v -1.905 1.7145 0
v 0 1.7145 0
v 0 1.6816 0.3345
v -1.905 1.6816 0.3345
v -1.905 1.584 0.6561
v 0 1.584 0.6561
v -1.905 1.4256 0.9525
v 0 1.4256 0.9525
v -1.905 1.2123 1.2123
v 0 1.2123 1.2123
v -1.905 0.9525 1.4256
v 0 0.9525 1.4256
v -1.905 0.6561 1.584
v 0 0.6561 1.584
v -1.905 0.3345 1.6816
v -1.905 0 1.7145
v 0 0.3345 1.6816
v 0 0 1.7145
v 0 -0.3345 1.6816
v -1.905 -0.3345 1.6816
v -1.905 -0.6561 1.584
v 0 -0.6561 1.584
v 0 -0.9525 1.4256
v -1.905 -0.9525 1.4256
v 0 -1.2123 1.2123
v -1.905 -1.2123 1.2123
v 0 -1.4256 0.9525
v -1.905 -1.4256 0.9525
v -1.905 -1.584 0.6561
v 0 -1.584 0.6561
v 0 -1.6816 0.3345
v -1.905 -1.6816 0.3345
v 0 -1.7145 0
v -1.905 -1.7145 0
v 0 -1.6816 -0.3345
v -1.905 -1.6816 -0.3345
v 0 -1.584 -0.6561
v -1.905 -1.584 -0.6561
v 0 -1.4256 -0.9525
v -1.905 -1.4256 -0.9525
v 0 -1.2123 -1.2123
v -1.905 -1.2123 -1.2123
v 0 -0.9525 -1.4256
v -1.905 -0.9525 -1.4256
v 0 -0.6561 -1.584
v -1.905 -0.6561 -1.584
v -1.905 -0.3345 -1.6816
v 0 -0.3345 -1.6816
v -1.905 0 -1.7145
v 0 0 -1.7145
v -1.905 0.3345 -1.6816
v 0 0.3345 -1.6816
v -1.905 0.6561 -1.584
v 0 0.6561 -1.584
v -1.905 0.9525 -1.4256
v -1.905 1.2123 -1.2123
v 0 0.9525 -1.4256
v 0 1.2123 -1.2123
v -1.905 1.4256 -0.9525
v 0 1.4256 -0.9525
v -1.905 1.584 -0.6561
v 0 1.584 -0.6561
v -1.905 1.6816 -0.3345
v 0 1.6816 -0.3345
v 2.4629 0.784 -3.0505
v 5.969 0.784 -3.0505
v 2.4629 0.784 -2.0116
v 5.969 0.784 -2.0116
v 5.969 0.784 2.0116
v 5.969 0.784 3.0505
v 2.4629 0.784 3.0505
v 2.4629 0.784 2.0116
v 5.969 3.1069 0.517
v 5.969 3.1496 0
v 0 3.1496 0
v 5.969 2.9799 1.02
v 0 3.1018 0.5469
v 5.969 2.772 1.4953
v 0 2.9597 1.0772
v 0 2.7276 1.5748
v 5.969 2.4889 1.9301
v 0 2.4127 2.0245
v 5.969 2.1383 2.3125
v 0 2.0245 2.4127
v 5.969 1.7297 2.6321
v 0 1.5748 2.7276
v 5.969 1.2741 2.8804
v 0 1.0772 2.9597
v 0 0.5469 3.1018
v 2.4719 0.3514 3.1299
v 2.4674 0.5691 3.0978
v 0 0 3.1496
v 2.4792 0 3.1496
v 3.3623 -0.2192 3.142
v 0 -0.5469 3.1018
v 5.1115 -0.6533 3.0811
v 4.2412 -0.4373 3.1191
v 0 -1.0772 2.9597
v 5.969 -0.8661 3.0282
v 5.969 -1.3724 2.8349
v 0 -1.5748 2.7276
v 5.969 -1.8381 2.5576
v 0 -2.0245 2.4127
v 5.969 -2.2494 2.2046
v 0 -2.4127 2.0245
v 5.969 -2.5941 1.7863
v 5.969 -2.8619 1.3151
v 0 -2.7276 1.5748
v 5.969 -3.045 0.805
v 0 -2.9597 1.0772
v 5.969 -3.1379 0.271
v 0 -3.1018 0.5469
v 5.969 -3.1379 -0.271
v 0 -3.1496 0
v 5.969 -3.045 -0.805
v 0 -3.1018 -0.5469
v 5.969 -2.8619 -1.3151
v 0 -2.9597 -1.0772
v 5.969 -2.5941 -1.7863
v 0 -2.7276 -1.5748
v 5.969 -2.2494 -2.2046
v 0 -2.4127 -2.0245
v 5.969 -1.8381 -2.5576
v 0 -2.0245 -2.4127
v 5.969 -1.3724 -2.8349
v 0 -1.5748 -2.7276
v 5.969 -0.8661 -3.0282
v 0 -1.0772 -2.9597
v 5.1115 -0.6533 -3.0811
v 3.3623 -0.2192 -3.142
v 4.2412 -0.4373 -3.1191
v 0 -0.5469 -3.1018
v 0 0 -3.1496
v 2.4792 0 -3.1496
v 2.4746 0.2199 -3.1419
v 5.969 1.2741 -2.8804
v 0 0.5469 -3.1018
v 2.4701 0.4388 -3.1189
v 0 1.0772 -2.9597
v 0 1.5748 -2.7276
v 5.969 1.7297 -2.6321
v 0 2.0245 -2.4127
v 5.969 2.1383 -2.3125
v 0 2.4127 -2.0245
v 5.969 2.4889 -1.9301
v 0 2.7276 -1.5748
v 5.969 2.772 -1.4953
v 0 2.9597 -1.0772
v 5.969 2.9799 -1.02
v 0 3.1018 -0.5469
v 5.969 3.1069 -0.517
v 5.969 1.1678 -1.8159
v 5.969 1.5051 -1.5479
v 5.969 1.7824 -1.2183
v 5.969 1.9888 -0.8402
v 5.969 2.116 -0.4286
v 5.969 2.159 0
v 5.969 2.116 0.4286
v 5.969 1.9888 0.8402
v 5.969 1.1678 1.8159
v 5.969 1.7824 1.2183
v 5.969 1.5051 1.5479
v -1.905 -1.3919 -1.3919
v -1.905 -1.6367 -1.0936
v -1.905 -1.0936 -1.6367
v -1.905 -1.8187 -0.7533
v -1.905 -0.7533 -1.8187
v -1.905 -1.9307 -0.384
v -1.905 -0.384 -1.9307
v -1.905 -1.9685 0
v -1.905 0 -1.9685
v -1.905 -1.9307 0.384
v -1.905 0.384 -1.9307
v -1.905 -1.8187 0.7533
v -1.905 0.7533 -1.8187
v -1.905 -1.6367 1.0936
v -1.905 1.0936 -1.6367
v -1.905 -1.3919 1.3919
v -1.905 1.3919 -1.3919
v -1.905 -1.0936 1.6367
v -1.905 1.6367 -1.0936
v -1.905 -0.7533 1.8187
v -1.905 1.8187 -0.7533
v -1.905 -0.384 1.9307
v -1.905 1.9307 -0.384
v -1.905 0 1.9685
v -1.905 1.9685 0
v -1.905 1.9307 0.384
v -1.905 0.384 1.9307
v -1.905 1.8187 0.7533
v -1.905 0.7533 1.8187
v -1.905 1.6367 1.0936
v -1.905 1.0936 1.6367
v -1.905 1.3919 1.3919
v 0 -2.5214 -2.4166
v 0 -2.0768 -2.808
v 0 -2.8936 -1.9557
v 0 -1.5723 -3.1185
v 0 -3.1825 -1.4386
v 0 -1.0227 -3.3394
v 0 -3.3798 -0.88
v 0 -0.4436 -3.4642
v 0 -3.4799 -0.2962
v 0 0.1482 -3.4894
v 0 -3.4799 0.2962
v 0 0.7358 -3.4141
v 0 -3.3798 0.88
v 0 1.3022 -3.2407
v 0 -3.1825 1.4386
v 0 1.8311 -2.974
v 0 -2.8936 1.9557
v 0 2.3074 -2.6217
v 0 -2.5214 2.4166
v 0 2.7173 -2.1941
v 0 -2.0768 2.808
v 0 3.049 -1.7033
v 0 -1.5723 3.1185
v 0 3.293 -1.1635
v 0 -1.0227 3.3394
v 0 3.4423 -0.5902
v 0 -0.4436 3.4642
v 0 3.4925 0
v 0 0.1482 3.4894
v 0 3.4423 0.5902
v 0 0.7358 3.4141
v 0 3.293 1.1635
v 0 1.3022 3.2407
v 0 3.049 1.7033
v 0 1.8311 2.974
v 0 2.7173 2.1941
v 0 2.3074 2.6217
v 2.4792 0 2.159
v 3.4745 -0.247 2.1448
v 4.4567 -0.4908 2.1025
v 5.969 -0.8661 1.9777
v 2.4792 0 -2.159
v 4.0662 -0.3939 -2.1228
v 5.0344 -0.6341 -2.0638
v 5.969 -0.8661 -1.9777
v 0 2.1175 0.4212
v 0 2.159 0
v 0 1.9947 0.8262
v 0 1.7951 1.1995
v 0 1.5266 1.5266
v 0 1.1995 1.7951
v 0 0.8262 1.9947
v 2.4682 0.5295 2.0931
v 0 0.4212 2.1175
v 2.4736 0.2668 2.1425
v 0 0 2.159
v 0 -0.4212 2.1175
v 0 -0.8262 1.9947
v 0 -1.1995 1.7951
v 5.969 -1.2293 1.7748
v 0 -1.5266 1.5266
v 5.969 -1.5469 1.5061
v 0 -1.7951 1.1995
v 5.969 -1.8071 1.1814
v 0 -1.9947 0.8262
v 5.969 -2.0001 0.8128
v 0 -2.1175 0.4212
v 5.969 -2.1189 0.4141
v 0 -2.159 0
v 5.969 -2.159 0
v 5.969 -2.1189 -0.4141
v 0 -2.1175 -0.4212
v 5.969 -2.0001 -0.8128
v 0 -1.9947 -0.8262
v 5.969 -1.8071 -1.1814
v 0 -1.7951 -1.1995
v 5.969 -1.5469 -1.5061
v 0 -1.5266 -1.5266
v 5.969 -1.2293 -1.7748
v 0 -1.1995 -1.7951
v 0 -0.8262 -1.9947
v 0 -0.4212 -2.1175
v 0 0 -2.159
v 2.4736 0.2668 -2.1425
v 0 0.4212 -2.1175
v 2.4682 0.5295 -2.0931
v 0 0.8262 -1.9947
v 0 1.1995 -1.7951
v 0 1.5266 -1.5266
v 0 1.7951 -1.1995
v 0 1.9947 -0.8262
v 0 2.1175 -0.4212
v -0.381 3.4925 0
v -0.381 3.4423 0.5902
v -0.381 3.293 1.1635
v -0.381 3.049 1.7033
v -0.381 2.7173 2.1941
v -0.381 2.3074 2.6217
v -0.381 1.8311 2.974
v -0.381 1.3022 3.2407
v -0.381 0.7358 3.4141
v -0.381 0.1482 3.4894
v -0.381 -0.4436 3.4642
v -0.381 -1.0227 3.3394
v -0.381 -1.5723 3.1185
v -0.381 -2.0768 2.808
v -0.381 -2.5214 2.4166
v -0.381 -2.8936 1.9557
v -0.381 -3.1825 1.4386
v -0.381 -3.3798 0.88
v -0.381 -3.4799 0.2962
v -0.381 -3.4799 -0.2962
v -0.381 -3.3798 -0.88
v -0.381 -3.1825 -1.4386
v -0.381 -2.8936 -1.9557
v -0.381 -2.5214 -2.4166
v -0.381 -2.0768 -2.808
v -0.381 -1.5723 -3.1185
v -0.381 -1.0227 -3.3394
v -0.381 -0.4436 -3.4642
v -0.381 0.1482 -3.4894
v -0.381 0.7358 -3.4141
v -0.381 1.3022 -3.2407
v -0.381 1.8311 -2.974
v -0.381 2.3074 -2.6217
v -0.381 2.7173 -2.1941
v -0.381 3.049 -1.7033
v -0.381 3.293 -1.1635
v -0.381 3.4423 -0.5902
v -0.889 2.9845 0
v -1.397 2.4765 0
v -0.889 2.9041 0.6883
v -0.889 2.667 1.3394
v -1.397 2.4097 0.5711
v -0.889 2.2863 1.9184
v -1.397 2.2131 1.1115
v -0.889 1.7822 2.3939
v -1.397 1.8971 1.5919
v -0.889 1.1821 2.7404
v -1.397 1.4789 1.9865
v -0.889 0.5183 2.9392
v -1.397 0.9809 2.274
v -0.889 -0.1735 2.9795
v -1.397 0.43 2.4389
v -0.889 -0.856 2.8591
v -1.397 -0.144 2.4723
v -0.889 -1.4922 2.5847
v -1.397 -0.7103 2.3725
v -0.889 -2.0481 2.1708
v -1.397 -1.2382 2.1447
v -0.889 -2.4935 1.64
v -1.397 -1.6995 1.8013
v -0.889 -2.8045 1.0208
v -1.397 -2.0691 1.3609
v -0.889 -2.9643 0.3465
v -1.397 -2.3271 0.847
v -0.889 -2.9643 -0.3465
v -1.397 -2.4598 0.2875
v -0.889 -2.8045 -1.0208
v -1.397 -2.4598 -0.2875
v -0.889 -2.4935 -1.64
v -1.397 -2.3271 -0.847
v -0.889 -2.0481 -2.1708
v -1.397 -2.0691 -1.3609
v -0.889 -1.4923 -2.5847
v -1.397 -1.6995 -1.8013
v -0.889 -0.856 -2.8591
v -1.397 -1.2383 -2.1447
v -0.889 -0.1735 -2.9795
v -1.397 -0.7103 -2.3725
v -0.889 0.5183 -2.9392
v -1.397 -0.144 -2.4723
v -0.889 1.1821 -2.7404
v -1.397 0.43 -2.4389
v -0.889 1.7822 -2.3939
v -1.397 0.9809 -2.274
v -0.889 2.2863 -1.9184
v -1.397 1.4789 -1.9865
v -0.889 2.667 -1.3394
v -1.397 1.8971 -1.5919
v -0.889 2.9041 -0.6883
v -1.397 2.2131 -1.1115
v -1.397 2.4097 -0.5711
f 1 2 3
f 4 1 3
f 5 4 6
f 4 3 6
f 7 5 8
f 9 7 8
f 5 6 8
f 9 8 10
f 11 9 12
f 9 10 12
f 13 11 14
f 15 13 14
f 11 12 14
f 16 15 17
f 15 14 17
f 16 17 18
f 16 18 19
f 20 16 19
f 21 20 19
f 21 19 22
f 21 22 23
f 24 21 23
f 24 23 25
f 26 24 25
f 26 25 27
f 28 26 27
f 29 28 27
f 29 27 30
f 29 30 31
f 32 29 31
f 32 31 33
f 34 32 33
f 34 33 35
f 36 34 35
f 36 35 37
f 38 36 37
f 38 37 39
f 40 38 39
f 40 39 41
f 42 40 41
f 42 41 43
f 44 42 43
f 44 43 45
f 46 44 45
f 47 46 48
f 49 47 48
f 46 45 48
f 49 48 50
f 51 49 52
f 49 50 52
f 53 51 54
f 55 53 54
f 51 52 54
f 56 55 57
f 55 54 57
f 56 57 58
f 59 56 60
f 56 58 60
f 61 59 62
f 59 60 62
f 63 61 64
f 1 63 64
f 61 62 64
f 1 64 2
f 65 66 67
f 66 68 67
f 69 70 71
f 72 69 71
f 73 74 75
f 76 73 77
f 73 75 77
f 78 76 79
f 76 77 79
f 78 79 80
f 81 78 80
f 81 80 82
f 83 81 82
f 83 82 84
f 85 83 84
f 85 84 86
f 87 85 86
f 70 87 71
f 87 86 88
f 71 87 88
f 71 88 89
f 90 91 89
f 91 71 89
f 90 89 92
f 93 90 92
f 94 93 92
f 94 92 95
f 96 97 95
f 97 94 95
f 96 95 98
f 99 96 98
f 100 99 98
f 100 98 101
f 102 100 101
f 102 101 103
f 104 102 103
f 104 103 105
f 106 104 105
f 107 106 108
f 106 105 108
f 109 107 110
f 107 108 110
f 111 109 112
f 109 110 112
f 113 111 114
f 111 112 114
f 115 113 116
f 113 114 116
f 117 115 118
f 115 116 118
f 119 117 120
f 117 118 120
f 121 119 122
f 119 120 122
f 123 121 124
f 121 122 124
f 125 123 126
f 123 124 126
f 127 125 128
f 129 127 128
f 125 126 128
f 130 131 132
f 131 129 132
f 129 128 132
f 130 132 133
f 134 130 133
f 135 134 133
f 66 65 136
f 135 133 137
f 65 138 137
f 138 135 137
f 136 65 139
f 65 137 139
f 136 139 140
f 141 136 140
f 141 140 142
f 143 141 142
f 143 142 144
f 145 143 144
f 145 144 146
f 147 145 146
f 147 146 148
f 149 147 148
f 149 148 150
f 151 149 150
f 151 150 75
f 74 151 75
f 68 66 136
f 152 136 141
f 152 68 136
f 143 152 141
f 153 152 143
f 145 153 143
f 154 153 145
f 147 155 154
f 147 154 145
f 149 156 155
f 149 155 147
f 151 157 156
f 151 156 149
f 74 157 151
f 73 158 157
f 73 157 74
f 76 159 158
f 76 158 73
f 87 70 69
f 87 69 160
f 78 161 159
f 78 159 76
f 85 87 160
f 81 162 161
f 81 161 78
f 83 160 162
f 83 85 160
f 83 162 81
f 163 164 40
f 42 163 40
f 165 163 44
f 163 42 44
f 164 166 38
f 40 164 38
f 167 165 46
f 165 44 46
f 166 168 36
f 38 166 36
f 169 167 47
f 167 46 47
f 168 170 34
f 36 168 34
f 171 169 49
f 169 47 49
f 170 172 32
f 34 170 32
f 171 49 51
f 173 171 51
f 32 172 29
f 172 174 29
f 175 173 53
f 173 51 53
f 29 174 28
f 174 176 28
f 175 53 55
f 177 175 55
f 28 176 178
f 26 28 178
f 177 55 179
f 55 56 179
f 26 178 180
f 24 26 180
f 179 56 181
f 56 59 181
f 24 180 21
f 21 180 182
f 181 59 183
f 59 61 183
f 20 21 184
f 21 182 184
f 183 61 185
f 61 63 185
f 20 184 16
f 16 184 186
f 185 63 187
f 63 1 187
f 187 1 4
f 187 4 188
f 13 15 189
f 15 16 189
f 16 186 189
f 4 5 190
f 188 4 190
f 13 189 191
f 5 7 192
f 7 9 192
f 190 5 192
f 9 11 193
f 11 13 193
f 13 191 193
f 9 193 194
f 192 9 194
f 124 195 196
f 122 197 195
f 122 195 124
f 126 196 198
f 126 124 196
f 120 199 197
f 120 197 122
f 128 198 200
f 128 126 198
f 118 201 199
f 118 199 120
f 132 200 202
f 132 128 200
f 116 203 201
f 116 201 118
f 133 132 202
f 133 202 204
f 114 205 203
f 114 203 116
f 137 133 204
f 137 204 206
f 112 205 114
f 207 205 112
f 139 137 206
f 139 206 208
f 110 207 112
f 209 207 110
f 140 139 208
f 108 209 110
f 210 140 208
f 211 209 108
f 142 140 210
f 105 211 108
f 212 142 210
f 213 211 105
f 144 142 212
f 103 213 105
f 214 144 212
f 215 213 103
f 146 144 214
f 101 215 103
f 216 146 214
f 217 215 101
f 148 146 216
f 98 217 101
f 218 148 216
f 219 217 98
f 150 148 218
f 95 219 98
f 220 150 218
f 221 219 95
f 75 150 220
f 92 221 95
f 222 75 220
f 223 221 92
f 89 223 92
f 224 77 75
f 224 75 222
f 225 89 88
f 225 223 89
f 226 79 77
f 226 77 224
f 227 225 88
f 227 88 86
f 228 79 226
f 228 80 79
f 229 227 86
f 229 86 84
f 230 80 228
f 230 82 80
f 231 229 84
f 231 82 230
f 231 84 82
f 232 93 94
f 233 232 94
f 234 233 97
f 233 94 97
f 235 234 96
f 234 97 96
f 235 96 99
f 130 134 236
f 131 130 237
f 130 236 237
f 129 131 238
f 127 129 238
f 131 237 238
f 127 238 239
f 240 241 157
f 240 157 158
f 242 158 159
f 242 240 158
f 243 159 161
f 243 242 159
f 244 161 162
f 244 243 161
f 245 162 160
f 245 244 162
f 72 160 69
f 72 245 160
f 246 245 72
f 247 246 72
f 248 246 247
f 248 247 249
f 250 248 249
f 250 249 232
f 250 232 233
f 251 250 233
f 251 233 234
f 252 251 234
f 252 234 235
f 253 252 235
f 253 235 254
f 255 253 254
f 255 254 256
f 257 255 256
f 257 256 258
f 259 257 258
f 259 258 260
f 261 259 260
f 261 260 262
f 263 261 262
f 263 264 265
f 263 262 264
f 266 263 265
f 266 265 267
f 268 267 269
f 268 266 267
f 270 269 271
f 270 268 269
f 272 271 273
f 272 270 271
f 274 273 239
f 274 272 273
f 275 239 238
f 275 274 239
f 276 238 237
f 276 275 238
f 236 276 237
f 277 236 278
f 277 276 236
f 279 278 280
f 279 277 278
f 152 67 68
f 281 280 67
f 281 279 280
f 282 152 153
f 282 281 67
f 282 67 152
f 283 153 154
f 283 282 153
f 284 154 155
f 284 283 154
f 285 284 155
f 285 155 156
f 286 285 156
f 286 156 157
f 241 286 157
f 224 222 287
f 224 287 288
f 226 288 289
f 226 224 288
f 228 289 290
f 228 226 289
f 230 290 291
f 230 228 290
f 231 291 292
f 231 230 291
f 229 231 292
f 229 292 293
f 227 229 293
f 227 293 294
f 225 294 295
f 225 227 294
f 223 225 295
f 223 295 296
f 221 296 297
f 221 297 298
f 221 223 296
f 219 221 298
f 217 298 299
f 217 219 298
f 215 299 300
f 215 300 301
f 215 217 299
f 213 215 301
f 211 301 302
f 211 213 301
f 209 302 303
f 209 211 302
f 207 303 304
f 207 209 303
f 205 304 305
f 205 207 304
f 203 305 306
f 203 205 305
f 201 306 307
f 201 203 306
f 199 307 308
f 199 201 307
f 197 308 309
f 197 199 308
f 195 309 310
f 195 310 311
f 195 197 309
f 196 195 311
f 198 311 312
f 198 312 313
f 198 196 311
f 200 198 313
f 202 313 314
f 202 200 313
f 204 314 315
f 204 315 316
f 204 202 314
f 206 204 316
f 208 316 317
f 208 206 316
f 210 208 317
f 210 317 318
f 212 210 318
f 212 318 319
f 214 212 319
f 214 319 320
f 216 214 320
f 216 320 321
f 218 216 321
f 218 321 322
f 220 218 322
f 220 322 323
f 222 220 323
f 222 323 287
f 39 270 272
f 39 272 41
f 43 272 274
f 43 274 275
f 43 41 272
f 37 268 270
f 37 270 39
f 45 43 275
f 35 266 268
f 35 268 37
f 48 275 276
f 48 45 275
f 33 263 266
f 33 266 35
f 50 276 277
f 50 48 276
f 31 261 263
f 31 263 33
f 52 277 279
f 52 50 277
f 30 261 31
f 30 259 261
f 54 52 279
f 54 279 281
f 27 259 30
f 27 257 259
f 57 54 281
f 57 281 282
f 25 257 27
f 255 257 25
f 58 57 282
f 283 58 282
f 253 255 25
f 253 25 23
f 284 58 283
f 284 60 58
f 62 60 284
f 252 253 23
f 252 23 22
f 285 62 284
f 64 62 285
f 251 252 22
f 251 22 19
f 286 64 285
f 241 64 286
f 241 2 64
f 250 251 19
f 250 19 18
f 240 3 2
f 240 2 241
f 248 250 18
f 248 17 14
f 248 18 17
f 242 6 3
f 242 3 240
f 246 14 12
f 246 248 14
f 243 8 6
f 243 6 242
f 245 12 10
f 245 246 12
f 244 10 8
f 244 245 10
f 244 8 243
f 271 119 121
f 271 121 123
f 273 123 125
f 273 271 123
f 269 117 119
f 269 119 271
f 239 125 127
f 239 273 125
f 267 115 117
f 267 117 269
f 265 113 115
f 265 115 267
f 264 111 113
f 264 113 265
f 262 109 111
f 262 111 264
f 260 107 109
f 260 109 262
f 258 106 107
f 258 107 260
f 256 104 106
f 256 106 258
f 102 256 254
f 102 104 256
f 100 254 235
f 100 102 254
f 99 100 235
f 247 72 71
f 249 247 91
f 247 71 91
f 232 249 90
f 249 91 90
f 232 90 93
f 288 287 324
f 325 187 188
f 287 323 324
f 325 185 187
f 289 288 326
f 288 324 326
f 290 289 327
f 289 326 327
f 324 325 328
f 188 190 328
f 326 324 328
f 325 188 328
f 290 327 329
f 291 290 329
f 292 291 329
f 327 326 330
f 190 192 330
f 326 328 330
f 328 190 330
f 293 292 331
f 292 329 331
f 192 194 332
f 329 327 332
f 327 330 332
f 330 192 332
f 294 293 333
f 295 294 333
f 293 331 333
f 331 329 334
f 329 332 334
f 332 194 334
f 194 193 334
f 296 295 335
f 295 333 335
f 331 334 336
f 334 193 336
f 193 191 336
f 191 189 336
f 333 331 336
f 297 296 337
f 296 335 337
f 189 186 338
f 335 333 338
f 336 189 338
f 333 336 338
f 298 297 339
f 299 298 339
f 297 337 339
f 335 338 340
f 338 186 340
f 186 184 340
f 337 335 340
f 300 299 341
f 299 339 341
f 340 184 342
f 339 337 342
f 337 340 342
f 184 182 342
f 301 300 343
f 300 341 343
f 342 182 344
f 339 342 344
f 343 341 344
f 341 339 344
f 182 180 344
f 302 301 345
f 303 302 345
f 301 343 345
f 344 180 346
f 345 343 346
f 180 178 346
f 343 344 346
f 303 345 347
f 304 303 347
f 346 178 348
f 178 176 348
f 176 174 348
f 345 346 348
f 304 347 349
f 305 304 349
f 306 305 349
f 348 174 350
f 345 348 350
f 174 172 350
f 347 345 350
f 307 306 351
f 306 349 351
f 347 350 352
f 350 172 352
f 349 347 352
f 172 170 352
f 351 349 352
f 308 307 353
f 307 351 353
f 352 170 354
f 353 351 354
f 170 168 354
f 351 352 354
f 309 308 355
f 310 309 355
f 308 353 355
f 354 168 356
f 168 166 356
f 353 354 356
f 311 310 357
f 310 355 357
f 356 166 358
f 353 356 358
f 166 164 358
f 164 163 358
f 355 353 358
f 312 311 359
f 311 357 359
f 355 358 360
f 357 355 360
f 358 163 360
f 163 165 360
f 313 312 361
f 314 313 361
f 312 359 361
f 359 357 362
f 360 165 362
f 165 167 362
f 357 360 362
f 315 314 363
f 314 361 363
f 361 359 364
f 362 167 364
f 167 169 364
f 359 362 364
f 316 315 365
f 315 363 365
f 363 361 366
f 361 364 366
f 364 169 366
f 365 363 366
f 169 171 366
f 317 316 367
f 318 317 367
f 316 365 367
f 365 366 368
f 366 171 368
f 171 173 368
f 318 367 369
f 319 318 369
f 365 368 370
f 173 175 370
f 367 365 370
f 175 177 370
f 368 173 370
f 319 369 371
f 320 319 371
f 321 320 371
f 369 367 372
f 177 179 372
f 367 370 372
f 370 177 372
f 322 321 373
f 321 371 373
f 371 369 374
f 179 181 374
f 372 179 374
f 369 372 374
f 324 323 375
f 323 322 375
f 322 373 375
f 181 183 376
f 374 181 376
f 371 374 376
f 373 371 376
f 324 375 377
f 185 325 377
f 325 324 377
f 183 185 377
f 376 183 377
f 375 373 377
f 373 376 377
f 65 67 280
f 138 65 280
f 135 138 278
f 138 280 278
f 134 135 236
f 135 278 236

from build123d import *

# Parameters (mm, degrees)
F2_R      = 3.1496
F3_DEPTH  = 5.969
F4_R      = 2.159
F5_DEPTH  = 8.9662
F0_R      = 1.7145
F6_DEPTH  = 3.7592
F8_DEPTH  = 12.7
F1_R      = 3.4925
F9_DEPTH  = 1.905
F10_DEPTH = 2.54
F11_SIZE  = 1.524


with BuildPart() as f3:
    # F2 (on Right) → F3 (new body)
    with BuildSketch(Plane.YZ):
        Circle(F2_R)
    extrude(amount=F3_DEPTH)

    # F4 (on Right) → F5 (cut)
    with BuildSketch(Plane.YZ):
        Circle(F4_R)
    extrude(amount=F5_DEPTH, mode=Mode.SUBTRACT)

    # F0 (on Right) → F6 (cut)
    with BuildSketch(Plane.YZ):
        Circle(F0_R)
    extrude(amount=-F6_DEPTH, mode=Mode.SUBTRACT)

    # F7 (on Top) → F8 (cut, symmetric)
    with BuildSketch(Plane.XY):
        Polygon((6.593515, 0.784034), (2.462917, 0.784034), (2.47918, 0), (6.593515, -1.02107), align=None)
    extrude(amount=F8_DEPTH, both=True, mode=Mode.SUBTRACT)

    # F1 (on Right) → F9 (join)
    with BuildSketch(Plane.YZ):
        Circle(F1_R)
    extrude(amount=-F9_DEPTH)

    # F0 (on Right) → F10 (cut)
    with BuildSketch(Plane.YZ):
        Circle(F0_R)
    extrude(amount=-F10_DEPTH, mode=Mode.SUBTRACT)

    # F11
    f11_edges = [f3.edges().sort_by_distance(p)[0] for p in [
        (-1.905, -3.4925, 0),
    ]]
    chamfer(f11_edges, length=F11_SIZE)


solid = f3.part
